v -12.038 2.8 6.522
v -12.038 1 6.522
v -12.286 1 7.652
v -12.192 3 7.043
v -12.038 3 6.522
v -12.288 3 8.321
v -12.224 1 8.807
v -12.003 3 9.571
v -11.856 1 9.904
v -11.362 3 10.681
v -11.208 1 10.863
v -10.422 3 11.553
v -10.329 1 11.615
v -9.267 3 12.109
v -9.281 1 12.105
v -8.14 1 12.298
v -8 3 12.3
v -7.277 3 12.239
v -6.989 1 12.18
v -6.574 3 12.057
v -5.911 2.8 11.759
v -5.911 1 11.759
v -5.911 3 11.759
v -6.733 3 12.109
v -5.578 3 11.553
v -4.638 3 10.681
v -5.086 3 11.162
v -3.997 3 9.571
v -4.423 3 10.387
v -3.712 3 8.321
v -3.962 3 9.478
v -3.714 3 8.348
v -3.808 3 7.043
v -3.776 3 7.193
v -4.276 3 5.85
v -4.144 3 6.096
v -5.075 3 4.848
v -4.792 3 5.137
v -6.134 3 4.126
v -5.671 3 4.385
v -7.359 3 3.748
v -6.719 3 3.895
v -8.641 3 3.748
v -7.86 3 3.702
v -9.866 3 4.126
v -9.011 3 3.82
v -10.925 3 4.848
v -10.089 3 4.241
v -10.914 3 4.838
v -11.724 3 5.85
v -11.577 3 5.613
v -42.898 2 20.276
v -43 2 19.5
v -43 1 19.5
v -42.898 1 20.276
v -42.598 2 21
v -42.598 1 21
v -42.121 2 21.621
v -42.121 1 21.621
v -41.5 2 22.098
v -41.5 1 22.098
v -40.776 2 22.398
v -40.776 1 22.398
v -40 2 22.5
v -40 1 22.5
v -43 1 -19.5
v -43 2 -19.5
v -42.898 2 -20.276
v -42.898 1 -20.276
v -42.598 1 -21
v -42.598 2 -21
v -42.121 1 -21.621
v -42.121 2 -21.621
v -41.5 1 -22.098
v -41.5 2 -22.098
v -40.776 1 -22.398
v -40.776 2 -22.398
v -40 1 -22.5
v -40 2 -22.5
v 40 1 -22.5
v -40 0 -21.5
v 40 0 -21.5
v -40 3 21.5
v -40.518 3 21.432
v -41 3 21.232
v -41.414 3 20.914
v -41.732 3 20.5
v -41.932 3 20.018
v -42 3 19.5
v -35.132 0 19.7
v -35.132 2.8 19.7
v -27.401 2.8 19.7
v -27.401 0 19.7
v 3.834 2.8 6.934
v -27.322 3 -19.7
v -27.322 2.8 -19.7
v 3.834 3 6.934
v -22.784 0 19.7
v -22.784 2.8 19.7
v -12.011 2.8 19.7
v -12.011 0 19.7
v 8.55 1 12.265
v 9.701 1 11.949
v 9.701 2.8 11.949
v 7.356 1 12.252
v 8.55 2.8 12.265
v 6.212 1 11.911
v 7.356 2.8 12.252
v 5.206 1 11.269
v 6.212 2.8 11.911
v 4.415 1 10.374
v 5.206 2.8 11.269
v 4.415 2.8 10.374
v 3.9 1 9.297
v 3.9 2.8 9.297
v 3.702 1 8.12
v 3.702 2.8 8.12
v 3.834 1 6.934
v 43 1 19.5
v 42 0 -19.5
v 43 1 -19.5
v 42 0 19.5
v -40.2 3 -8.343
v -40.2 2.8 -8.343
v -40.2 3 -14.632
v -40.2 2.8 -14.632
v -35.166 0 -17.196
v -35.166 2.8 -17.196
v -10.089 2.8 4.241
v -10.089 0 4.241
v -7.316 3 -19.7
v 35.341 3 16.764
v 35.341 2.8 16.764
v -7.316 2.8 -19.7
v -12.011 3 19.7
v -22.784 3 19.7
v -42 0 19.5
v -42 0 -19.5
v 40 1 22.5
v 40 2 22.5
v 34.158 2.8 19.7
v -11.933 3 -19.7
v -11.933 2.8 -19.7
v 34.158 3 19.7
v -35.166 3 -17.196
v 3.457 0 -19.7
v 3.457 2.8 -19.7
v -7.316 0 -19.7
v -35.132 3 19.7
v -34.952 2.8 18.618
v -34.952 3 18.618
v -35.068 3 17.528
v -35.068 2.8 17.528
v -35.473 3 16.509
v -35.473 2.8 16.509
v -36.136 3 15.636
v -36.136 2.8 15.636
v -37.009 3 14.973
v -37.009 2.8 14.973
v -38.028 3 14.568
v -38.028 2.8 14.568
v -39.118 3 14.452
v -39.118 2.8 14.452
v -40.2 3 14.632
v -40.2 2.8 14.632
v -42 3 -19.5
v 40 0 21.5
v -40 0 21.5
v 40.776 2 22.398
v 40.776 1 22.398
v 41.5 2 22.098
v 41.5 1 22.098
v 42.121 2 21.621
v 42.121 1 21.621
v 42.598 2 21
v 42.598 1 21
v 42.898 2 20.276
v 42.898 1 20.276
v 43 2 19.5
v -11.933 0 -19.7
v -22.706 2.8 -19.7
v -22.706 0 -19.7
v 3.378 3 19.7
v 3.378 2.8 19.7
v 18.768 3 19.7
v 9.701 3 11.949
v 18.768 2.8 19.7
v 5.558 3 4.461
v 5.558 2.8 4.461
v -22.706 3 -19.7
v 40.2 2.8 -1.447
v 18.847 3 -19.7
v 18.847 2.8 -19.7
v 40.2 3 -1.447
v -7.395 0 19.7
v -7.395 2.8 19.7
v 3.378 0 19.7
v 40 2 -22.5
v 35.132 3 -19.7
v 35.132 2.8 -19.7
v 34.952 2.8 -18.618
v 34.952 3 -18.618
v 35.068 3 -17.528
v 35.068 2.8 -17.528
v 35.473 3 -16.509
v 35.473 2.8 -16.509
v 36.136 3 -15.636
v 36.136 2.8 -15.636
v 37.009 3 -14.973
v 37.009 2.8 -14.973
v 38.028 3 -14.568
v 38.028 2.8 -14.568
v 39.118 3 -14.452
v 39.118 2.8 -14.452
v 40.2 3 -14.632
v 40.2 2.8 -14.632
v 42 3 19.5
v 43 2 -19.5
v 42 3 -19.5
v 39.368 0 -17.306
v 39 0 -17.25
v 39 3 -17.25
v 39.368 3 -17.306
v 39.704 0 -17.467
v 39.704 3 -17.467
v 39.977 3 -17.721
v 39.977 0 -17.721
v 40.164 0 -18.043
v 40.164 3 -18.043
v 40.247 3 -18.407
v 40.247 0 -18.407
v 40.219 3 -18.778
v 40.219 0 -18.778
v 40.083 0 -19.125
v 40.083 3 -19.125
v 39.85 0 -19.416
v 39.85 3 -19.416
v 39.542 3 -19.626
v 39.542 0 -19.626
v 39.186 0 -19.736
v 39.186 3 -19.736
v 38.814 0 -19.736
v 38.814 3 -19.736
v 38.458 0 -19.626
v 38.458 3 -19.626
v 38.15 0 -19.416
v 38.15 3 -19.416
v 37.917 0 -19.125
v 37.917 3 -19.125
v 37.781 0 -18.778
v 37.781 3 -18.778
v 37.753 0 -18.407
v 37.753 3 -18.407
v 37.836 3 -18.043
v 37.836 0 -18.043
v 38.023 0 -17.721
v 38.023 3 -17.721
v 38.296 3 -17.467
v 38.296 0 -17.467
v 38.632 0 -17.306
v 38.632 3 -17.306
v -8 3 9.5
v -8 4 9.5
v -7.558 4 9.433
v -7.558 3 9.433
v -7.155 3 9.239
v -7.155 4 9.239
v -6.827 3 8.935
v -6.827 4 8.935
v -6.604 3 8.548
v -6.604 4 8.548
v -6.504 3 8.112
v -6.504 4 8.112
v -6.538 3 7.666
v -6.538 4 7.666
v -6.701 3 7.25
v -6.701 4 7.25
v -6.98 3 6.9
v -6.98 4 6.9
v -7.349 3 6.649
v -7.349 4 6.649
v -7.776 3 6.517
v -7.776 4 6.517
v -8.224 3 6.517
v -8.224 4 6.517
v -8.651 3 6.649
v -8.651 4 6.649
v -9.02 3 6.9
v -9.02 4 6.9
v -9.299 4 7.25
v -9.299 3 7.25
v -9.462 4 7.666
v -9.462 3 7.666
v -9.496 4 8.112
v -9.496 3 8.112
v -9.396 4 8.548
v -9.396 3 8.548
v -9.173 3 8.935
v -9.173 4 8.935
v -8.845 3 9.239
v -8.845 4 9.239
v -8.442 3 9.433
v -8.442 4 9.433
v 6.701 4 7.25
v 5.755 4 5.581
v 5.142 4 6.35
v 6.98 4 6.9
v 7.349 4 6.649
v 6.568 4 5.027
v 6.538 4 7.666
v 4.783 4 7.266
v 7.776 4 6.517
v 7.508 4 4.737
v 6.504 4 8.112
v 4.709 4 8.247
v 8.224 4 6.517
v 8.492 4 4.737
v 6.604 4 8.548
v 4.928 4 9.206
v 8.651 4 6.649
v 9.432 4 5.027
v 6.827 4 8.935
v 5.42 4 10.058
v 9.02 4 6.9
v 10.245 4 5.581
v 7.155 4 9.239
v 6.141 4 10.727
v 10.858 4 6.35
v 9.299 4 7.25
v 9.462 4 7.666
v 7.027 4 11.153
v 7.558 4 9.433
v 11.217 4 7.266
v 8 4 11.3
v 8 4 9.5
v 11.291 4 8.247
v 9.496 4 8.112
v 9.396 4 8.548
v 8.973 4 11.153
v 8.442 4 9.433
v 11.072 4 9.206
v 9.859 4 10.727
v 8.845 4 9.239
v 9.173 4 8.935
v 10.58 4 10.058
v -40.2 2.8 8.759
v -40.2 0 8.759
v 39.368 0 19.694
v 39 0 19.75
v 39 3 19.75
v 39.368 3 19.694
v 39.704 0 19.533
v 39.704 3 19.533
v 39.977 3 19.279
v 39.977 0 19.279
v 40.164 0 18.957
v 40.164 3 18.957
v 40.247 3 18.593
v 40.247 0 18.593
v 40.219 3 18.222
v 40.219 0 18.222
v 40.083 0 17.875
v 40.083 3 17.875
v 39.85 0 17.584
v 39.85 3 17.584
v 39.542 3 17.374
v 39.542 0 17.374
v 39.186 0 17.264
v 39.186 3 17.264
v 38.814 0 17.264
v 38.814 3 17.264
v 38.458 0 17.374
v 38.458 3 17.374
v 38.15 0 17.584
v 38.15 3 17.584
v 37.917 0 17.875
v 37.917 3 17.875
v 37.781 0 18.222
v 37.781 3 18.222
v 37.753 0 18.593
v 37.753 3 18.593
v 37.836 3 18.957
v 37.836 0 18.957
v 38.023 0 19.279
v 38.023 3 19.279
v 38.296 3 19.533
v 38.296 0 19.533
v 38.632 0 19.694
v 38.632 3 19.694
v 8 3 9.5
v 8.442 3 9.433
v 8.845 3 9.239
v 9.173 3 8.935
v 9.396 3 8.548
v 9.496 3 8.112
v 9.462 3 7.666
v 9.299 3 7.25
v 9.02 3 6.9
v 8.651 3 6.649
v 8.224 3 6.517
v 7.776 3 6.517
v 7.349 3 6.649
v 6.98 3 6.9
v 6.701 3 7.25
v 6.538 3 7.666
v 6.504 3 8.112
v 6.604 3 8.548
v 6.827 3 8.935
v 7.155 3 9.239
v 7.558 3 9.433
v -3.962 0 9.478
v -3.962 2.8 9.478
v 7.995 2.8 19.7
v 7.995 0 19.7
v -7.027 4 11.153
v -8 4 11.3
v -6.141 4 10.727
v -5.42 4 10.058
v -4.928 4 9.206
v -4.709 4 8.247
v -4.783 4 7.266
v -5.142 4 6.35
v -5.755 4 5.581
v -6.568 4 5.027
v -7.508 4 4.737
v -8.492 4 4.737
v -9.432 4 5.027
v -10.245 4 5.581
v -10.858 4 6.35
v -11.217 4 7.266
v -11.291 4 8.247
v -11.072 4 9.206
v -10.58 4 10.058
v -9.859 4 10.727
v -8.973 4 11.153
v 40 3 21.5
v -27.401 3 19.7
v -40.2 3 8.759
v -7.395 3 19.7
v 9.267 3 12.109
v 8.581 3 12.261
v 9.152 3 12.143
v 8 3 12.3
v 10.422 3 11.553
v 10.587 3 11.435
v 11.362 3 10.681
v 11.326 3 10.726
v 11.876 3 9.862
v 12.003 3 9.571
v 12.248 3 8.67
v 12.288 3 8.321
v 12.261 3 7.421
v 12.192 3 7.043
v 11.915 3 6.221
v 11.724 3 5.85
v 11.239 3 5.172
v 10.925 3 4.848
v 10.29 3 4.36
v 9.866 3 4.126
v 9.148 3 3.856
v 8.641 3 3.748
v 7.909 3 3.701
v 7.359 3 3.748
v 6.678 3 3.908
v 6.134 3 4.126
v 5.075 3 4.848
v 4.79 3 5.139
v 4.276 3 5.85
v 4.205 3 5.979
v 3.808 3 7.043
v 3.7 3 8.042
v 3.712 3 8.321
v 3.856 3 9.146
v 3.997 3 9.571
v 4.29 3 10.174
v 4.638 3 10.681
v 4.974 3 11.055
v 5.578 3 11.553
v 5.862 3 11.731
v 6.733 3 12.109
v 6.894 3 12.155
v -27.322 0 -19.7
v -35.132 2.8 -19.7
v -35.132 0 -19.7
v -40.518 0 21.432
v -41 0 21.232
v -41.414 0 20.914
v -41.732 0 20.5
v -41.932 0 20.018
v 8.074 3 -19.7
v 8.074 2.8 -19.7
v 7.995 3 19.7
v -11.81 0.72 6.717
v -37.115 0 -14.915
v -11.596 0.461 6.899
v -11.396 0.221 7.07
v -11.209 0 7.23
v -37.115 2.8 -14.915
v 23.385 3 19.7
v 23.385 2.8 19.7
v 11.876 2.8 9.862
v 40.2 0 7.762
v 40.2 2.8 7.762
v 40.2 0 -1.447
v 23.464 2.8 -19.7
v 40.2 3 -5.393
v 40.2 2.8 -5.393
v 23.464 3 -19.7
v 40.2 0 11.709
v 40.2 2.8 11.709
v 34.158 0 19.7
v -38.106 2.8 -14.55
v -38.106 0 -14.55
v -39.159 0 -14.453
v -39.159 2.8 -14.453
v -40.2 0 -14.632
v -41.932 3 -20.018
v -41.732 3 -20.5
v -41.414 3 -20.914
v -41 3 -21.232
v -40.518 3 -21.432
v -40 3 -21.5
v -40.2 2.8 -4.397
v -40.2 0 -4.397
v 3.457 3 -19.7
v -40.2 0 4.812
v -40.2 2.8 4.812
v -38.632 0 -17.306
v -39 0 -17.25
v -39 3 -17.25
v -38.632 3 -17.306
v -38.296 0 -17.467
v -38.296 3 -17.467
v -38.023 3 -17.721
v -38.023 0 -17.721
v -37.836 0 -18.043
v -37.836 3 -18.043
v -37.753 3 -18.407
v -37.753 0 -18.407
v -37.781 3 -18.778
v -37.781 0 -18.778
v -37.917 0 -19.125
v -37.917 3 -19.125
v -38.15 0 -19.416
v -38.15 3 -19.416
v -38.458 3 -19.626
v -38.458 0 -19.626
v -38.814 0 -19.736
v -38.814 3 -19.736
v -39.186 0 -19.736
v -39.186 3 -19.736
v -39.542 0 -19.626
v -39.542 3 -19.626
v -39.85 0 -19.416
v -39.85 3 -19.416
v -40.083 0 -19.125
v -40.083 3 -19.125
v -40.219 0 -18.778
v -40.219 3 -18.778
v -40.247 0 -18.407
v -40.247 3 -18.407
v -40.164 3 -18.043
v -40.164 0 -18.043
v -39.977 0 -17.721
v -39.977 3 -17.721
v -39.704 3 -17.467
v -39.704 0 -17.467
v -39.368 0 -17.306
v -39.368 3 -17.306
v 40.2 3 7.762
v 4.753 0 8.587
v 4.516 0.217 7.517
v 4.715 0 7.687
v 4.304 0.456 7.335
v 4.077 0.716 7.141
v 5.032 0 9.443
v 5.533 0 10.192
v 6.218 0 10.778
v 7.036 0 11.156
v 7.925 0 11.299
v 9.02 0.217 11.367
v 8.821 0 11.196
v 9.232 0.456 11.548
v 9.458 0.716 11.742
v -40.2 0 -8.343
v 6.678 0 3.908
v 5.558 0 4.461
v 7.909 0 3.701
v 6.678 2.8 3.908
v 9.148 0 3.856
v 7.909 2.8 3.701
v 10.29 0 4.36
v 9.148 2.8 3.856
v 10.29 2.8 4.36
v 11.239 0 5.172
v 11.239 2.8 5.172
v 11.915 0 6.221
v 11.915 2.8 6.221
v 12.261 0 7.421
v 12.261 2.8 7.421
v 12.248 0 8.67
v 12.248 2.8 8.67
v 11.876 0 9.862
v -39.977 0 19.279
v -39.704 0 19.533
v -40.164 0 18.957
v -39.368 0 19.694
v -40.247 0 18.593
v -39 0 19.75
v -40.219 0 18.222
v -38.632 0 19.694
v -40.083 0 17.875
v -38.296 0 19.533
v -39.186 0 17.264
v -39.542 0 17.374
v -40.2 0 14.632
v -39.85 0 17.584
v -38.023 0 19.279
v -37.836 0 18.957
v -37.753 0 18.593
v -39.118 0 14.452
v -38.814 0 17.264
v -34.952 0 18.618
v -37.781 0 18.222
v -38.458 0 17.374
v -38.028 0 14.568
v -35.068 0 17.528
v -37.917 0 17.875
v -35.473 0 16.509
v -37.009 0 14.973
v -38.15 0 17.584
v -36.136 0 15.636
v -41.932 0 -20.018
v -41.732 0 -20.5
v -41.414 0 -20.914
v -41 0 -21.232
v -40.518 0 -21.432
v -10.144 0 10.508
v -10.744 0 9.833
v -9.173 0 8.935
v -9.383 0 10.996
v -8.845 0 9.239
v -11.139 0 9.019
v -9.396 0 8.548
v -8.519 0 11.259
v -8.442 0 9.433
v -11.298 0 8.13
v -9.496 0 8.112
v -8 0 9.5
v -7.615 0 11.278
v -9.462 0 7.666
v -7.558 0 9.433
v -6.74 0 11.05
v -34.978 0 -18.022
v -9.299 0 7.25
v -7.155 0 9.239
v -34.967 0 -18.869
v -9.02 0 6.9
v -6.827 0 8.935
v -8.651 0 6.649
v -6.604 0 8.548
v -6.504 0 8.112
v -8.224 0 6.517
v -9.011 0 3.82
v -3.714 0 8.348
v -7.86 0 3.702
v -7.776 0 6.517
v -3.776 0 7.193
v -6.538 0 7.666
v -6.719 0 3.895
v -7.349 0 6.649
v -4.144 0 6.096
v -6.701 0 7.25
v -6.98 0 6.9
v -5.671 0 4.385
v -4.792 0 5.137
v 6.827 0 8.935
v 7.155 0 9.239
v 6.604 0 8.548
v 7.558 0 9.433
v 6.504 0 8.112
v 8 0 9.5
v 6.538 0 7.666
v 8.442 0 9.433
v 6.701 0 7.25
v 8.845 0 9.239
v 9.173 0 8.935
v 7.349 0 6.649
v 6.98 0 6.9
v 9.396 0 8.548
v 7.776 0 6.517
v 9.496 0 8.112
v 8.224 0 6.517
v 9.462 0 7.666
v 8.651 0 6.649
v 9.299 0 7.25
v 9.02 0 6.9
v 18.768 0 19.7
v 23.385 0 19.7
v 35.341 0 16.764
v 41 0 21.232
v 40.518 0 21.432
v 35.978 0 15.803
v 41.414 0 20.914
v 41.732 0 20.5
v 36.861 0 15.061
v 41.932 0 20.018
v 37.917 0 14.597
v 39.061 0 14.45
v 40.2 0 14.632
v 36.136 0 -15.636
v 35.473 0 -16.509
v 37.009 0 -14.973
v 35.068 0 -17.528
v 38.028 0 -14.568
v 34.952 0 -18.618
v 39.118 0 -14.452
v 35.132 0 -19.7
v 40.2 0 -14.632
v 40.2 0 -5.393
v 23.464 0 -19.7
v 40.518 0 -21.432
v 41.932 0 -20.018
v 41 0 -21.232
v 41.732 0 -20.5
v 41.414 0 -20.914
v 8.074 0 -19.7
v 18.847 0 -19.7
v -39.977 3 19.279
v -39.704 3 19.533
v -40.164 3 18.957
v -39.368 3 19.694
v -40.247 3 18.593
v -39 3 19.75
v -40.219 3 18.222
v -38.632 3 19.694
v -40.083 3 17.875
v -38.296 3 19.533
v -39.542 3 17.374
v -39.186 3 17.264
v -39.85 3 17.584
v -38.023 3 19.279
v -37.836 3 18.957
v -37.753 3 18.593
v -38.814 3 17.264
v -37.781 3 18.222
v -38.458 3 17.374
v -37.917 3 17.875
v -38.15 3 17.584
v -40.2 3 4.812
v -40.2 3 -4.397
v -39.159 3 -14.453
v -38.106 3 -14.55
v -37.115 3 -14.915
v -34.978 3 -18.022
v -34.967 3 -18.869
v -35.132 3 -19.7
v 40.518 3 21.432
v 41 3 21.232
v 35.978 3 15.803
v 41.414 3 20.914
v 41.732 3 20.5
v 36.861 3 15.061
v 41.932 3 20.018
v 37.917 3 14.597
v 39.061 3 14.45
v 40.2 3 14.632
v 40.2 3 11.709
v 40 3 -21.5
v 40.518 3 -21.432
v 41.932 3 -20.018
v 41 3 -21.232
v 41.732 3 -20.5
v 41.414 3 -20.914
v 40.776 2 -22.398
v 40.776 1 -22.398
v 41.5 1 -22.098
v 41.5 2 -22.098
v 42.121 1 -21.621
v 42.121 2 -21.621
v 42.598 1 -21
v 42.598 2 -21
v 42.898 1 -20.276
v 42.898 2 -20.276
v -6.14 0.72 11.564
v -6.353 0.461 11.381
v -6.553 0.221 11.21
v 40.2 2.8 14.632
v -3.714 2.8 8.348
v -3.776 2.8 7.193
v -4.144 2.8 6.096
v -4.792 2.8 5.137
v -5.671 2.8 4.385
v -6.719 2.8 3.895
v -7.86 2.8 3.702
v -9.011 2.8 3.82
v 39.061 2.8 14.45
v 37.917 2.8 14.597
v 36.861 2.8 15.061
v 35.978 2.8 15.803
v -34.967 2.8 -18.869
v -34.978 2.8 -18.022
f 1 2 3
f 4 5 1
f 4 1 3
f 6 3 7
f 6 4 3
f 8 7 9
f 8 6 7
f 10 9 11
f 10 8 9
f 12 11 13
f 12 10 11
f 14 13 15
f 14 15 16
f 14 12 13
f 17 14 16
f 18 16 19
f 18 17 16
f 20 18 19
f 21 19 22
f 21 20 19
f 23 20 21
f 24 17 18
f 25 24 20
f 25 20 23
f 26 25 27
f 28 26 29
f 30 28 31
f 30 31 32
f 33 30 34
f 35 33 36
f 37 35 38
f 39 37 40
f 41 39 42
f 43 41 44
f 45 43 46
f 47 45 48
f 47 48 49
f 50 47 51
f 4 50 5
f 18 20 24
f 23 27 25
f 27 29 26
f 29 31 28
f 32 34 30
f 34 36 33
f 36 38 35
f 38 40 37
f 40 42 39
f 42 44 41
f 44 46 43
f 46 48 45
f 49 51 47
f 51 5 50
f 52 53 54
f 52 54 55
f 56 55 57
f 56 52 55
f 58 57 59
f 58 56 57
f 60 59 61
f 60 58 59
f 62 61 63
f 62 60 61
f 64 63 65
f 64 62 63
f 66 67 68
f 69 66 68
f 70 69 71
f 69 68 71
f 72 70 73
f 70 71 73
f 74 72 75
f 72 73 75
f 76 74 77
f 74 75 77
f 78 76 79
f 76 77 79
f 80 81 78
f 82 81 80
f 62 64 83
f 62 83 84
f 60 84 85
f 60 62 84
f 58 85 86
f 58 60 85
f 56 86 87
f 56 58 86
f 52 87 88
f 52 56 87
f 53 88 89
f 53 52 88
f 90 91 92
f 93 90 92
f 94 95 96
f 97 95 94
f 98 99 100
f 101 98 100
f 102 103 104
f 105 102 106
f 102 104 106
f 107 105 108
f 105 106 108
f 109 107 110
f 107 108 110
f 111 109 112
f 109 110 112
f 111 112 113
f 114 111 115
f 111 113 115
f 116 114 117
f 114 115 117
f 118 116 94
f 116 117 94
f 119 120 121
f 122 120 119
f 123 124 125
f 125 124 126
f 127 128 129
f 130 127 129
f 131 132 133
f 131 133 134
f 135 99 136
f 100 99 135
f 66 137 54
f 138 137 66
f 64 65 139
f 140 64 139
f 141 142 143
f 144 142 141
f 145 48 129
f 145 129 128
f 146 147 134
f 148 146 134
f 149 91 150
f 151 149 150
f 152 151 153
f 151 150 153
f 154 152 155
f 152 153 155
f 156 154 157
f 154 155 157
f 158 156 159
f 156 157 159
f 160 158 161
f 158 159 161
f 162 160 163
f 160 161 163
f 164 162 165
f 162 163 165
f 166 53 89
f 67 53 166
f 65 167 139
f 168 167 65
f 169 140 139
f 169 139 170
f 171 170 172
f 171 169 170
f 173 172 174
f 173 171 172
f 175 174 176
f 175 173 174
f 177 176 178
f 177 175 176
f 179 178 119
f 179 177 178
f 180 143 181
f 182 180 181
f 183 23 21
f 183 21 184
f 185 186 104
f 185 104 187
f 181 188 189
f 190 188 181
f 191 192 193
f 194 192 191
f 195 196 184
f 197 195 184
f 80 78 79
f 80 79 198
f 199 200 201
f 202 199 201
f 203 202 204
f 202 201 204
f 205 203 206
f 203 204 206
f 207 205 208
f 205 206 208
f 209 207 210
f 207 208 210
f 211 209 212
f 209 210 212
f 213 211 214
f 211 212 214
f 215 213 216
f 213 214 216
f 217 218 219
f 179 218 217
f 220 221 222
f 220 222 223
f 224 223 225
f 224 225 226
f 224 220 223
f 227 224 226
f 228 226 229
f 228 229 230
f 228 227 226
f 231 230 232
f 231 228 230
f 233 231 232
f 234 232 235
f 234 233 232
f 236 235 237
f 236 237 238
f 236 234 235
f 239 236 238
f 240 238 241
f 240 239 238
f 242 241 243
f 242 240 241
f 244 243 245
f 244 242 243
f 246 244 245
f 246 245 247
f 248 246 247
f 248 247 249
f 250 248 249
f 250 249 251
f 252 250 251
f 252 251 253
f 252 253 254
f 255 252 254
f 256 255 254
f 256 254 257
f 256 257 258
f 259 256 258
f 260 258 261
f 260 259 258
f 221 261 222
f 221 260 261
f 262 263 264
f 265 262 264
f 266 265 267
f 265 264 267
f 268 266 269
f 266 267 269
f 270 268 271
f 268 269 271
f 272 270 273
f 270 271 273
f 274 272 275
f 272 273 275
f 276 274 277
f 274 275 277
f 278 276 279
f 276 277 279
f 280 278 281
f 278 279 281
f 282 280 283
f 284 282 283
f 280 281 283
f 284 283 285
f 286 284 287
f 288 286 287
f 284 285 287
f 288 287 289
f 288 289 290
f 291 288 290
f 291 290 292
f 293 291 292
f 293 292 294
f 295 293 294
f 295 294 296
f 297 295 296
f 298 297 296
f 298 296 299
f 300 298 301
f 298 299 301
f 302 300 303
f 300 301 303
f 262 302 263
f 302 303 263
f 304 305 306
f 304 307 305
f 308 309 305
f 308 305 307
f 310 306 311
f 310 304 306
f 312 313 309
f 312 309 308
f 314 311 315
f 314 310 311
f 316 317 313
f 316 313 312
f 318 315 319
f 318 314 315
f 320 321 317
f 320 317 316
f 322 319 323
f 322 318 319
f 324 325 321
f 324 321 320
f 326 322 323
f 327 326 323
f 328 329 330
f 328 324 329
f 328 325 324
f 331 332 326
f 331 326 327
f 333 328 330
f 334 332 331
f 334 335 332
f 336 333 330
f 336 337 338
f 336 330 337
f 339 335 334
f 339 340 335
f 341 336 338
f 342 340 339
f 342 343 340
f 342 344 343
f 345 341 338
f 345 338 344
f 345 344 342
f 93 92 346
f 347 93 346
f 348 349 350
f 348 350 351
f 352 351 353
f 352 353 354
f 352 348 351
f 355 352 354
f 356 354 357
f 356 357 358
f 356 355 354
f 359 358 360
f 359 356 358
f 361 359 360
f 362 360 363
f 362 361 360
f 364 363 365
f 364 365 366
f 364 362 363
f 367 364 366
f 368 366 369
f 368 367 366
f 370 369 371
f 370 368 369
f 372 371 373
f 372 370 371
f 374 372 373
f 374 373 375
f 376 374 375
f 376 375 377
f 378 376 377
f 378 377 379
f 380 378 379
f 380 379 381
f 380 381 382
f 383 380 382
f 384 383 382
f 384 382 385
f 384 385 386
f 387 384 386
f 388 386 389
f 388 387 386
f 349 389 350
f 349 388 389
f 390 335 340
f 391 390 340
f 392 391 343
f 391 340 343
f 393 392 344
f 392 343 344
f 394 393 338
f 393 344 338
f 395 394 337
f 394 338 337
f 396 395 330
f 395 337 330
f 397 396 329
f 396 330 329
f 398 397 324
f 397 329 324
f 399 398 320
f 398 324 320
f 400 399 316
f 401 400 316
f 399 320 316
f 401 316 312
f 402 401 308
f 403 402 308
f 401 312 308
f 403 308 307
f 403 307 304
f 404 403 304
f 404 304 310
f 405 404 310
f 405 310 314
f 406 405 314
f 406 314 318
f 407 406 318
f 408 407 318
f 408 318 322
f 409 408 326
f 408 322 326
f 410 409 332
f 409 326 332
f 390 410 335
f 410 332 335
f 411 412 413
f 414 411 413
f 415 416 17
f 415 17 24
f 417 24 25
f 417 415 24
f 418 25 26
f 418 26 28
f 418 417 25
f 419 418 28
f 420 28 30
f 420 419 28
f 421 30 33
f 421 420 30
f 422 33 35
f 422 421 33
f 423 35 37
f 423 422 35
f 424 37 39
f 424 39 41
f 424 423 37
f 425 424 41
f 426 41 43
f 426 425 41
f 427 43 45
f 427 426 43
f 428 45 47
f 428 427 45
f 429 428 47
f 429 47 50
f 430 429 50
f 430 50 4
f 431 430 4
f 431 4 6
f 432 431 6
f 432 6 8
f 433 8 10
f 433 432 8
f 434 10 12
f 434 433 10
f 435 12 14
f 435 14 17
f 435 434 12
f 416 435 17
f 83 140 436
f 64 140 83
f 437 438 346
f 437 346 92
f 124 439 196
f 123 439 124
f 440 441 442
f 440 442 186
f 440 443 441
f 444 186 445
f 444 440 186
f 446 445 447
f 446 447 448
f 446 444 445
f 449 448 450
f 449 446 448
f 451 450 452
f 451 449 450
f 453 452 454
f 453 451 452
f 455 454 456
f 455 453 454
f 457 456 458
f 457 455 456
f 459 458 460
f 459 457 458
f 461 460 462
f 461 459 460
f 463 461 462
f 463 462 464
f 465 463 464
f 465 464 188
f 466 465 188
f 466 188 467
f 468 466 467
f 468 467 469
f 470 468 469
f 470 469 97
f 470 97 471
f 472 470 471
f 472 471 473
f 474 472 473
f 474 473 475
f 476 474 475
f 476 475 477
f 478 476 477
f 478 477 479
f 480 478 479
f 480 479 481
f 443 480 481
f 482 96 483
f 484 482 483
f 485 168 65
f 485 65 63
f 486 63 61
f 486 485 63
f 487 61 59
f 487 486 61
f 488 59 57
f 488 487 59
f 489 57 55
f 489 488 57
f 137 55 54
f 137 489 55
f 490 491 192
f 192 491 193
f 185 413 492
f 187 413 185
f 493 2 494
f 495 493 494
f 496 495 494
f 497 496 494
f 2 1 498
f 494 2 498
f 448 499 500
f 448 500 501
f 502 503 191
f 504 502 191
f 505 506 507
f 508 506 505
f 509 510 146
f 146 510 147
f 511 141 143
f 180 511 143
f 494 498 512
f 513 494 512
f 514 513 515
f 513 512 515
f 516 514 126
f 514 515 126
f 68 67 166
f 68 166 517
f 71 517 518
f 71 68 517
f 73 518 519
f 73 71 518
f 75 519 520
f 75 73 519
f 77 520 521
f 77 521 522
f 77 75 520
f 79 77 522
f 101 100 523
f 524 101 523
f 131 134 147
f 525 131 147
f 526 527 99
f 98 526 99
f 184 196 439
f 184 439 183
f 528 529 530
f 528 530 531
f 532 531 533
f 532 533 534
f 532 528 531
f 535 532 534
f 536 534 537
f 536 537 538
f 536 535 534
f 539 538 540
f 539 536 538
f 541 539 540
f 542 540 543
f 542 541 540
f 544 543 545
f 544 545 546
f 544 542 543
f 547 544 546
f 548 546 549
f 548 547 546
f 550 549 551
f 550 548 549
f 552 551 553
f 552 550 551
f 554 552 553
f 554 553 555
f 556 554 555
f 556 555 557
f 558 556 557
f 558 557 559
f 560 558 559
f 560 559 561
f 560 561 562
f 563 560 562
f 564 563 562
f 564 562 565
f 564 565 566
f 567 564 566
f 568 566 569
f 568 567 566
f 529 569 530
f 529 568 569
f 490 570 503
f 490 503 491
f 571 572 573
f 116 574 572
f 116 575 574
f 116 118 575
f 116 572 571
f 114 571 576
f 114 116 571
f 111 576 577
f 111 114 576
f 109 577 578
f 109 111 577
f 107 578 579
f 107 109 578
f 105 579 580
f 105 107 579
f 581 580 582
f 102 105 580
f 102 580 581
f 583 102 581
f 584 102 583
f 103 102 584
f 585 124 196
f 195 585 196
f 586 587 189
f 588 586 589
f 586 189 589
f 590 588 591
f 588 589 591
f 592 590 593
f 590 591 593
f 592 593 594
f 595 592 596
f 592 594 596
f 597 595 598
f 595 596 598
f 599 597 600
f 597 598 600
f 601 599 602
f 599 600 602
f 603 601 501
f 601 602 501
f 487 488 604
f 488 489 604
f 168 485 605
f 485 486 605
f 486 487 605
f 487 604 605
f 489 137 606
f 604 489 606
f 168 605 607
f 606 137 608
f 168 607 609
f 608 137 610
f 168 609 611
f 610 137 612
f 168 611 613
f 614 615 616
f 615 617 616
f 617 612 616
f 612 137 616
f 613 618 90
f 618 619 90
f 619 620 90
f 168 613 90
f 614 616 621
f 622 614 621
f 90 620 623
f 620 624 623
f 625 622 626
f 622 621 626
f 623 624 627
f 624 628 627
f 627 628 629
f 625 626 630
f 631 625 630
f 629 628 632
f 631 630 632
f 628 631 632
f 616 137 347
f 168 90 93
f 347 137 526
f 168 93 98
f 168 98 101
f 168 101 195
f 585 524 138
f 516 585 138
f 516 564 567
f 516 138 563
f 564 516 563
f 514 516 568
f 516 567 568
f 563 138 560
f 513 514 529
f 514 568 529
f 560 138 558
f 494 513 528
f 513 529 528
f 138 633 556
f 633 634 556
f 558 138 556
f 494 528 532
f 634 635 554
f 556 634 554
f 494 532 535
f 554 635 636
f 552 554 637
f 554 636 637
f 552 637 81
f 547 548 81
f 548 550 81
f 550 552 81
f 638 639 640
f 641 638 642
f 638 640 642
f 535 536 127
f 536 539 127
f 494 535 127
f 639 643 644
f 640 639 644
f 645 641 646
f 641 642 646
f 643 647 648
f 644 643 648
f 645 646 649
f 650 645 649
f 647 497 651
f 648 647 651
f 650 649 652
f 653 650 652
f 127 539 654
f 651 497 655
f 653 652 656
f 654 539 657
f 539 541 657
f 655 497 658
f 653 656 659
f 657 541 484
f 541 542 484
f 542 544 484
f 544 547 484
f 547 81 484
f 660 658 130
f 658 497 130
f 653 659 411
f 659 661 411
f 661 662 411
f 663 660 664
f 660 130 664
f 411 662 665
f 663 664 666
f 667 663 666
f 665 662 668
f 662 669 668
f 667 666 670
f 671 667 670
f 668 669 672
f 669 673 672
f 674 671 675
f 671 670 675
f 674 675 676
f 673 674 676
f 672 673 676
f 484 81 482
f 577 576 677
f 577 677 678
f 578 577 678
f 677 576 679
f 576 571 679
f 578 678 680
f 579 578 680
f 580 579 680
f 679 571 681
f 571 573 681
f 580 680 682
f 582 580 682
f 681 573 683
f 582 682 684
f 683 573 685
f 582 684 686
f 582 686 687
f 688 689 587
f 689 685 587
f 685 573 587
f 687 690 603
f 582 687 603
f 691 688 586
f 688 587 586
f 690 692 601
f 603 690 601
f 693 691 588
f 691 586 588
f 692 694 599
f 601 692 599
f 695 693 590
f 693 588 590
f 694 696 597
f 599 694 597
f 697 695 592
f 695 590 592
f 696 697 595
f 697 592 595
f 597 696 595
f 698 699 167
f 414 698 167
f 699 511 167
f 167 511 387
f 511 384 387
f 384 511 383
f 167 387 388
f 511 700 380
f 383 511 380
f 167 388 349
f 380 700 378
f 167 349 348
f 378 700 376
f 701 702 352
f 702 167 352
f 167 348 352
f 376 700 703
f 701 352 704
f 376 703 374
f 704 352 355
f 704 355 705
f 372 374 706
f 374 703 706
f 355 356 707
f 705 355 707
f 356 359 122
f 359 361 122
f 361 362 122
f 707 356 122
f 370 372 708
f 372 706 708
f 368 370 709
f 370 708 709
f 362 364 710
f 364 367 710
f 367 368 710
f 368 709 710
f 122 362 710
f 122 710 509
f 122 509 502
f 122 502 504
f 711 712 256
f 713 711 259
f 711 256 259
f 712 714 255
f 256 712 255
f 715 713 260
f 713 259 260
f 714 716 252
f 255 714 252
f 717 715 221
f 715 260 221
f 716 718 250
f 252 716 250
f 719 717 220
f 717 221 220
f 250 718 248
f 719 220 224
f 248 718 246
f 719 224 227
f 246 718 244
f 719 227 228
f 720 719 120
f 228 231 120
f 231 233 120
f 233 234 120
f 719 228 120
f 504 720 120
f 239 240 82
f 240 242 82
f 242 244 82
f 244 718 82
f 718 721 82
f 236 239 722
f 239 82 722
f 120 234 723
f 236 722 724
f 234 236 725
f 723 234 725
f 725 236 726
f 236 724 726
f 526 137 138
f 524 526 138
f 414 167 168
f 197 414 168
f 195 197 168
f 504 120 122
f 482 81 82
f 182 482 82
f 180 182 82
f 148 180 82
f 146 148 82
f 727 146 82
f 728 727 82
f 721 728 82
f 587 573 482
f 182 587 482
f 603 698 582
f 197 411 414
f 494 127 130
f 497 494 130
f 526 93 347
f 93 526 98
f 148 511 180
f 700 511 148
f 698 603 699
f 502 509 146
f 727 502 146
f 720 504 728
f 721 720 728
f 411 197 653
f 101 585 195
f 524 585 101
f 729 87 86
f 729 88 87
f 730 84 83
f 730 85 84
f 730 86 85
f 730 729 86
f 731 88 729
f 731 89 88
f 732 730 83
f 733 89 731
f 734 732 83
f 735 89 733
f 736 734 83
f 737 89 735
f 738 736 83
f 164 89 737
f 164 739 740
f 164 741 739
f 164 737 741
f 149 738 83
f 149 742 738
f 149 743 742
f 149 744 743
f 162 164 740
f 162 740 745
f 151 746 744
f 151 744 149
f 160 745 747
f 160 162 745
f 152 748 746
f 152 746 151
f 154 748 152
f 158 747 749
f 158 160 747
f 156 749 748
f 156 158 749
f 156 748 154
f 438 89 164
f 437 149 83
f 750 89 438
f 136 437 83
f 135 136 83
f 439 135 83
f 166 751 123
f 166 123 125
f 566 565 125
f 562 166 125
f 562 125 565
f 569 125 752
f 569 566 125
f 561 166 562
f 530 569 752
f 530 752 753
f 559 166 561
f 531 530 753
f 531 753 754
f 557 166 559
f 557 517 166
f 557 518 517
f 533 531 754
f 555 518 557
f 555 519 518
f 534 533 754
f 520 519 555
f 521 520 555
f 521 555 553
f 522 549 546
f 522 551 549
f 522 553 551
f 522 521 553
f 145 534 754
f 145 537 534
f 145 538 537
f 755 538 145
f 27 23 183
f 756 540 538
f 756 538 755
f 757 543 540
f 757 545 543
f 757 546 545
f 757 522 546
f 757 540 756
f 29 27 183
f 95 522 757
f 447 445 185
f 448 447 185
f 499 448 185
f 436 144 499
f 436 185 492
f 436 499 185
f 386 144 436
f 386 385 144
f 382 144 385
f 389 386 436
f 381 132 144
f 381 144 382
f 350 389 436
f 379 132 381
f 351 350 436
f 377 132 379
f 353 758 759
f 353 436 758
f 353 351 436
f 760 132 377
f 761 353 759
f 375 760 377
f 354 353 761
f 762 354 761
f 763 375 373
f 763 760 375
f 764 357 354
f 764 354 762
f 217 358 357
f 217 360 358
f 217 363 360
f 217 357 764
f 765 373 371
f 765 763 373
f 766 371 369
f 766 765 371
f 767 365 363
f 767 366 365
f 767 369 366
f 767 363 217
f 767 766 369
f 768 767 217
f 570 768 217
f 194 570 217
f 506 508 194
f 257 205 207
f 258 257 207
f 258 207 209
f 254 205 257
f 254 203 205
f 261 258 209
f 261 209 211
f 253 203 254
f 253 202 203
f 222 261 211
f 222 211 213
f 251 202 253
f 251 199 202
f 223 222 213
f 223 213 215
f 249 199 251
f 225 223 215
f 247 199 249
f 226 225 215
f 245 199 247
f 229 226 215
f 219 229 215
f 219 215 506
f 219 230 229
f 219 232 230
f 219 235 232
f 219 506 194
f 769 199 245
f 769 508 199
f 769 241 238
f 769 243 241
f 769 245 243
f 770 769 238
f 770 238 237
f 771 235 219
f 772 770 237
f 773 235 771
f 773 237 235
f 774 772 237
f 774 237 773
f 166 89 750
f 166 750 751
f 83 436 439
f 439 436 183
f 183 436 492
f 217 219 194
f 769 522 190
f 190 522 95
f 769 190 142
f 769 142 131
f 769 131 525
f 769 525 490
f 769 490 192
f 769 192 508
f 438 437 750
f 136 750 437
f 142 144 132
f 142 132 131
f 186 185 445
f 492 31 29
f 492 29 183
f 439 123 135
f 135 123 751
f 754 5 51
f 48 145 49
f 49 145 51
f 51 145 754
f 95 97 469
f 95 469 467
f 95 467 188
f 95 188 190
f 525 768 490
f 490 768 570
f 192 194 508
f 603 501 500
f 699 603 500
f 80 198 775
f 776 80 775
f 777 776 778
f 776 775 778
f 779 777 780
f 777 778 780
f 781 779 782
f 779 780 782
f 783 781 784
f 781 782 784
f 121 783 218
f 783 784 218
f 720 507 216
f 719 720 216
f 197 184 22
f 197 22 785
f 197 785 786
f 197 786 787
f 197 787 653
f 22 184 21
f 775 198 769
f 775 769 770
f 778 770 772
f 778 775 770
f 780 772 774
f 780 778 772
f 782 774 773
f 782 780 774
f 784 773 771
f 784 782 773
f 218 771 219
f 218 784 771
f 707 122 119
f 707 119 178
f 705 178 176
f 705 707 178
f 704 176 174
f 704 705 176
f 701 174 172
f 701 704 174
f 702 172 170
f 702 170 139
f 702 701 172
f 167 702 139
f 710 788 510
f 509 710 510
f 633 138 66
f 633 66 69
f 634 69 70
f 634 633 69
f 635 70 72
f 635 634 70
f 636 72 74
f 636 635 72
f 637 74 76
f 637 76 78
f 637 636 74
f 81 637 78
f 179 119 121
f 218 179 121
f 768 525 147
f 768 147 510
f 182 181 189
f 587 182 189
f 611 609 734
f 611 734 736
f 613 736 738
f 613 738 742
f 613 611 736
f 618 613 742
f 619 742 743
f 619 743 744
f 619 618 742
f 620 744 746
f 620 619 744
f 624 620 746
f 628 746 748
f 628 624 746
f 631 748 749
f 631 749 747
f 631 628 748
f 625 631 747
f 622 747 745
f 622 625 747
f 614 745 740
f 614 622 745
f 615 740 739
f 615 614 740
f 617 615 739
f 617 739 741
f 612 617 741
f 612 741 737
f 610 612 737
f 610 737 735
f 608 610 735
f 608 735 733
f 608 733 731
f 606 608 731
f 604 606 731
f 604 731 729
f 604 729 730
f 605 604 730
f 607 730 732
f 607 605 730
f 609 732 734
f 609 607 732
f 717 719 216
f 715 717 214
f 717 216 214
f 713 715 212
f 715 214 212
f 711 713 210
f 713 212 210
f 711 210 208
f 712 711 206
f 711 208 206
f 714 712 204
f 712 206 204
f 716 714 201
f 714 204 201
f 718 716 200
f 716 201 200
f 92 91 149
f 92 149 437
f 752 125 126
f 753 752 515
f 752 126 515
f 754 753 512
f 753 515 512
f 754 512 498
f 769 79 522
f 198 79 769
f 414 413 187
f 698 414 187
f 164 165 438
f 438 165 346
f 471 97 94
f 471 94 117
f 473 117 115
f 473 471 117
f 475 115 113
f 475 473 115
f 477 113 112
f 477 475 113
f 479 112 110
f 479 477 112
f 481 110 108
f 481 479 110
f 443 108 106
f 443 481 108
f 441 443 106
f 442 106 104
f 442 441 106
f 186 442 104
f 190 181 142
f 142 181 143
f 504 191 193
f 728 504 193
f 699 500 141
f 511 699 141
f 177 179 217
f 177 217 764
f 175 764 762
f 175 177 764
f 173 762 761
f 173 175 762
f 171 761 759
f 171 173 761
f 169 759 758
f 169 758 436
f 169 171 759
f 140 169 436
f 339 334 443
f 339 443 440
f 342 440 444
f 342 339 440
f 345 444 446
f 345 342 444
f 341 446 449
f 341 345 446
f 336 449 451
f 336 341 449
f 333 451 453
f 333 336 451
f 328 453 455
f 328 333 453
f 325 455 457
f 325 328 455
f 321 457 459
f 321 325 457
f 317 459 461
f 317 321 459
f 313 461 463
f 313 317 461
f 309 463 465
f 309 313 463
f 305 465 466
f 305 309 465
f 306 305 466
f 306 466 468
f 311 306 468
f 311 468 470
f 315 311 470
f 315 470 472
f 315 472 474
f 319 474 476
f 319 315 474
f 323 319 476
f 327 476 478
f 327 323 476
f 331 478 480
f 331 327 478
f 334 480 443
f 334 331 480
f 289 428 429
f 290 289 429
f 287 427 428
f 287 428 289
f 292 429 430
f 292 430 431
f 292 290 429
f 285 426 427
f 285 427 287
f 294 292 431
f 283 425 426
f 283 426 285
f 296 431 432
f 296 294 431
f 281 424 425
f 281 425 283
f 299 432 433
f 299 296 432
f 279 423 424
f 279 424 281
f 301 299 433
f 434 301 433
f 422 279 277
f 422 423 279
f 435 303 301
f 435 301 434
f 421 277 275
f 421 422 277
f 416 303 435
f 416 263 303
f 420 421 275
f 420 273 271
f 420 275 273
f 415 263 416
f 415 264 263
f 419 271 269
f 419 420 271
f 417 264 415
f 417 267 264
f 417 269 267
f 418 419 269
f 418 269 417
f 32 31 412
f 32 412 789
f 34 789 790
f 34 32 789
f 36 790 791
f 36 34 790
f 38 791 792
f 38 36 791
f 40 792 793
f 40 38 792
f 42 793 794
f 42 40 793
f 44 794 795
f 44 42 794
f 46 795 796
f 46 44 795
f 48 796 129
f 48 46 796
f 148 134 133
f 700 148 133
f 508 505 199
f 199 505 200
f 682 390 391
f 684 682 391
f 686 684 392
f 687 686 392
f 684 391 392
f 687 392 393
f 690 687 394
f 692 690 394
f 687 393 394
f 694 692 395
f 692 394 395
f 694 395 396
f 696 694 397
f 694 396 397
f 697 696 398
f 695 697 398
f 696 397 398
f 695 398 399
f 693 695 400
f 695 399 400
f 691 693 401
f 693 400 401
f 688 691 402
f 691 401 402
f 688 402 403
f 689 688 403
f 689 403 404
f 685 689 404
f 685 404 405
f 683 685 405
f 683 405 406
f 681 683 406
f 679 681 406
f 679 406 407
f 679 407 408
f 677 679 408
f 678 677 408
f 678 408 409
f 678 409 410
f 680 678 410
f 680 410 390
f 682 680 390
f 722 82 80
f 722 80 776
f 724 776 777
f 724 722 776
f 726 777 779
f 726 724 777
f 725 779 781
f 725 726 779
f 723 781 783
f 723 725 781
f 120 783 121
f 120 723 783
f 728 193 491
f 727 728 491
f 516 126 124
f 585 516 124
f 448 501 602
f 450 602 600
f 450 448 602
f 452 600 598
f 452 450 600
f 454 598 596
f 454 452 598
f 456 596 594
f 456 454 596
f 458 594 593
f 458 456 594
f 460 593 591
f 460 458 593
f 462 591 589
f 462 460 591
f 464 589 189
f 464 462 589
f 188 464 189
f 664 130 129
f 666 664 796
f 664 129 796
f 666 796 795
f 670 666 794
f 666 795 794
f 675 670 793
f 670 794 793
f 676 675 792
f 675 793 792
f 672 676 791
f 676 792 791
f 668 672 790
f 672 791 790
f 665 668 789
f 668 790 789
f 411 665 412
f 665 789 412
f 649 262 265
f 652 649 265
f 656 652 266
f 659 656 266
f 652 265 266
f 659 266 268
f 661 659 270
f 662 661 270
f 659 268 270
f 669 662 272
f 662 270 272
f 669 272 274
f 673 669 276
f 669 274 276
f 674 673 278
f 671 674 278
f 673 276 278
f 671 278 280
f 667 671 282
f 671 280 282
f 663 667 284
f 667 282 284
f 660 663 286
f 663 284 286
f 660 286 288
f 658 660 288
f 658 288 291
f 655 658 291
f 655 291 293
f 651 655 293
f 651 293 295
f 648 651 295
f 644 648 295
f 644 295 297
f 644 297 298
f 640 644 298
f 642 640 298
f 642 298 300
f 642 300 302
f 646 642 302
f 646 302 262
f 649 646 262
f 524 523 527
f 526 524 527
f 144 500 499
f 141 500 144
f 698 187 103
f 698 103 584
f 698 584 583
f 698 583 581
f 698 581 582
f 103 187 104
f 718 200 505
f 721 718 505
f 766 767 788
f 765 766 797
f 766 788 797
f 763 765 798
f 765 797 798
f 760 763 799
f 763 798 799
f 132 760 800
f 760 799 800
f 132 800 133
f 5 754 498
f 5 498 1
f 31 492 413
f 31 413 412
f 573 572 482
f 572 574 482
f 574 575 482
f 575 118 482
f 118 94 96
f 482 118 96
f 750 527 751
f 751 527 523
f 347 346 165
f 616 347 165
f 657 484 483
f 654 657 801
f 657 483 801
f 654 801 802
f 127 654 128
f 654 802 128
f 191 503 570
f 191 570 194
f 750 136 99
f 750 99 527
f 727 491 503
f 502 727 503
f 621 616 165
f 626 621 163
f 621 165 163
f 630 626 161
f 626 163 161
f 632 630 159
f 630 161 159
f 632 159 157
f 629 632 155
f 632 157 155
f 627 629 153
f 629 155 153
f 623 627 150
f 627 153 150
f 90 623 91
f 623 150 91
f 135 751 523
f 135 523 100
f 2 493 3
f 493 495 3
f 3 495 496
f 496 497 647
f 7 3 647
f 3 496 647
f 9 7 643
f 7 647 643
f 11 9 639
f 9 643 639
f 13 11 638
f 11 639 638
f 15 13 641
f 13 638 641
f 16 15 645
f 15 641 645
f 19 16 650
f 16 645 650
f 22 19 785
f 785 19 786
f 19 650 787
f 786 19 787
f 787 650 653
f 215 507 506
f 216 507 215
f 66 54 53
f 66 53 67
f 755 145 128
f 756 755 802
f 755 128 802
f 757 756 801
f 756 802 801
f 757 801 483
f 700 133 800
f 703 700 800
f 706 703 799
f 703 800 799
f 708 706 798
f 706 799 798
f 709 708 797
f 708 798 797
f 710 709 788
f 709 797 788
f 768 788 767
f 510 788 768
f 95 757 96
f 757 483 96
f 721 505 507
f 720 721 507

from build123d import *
from build123d.topology import SkipClean

# Parameters (mm, degrees)
SKETCH1_W           = 86
SKETCH1_H           = 45
SKETCH1_R           = 1.25
BOSS_EXTRUDE1_DEPTH = 3
FILLET1_R           = 3
SKETCH2_R           = 1.5
CUT_EXTRUDE1_DEPTH  = 49.623553963
SHELL1_T            = -2.8
RIB1_REACH          = 50.624
CUT_EXTRUDE2_DEPTH  = 49.623553963
BOSS_EXTRUDE2_START = 1
SKETCH5_R           = 4.3
SKETCH5_R_2         = 1.5
BOSS_EXTRUDE2_DEPTH = 1
CHAMFER1_SIZE       = 1


with BuildPart() as part:
    # Sketch1 → Boss-Extrude1 (new body)
    with BuildSketch(Plane(origin=(0, 0, 0), x_dir=(1, 0, 0), z_dir=(0, 1, 0))):
        Rectangle(SKETCH1_W, SKETCH1_H)
        with Locations(Location((-39, 18.5, 0), (0, 0, 270))):
            Circle(SKETCH1_R, mode=Mode.SUBTRACT)
        with Locations(Location((39, 18.5, 0), (0, 0, 270))):
            Circle(SKETCH1_R, mode=Mode.SUBTRACT)
        with Locations(Location((39, -18.5, 0), (0, 0, 270))):
            Circle(SKETCH1_R, mode=Mode.SUBTRACT)
        with Locations(Location((-39, -18.5, 0), (0, 0, 270))):
            Circle(SKETCH1_R, mode=Mode.SUBTRACT)
    extrude(amount=BOSS_EXTRUDE1_DEPTH)

    # Fillet1
    fillet1_edges = [part.edges().sort_by_distance(p)[0] for p in [
        (43, 1.5, 22.5),
        (-43, 1.5, 22.5),
        (-43, 1.5, -22.5),
        (43, 1.5, -22.5),
    ]]
    fillet(fillet1_edges, radius=FILLET1_R)

    # Sketch2 → Cut-Extrude1 (cut, through all)
    with BuildSketch(Plane(origin=(0, 3, 0), x_dir=(1, 0, 0), z_dir=(0, 1, 0))):
        with Locations(Location((8, -8, 0), (0, 0, 270))):
            Circle(SKETCH2_R)
        with Locations(Location((-8, -8, 0), (0, 0, 270))):
            Circle(SKETCH2_R)
    extrude(amount=-CUT_EXTRUDE1_DEPTH, mode=Mode.SUBTRACT)

    # Shell1
    shell1_openings = [part.faces().sort_by_distance(p)[0] for p in [
        (0, 3, -0.029540883),
    ]]
    offset(amount=SHELL1_T, openings=shell1_openings)

    # Sketch3 walls → Rib1 (add, up to next)
    with BuildSketch(Plane(origin=(0, 3, 0), x_dir=(1, 0, 0), z_dir=(0, 1, 0)), mode=Mode.PRIVATE) as rib1_sk1:
        Polygon((-77.783977456, 23.369087639), (9.570170192, -51.304619221), (11.519513639, -49.024255188), (-75.834634008, 25.649451672), align=None)
    rib1_tool1 = extrude(rib1_sk1.sketch, amount=-RIB1_REACH, mode=Mode.PRIVATE) - part.part
    # Sketch3 walls → Rib1 (add, up to next)
    with BuildSketch(Plane(origin=(0, 3, 0), x_dir=(1, 0, 0), z_dir=(0, 1, 0)), mode=Mode.PRIVATE) as rib1_sk2:
        Polygon((-75.930079406, 34.940098058), (22.974178135, -49.60708984), (24.923521582, -47.326725807), (-73.980735959, 37.220462091), align=None)
    rib1_tool2 = extrude(rib1_sk2.sketch, amount=-RIB1_REACH, mode=Mode.PRIVATE) - part.part
    # Sketch3 walls → Rib1 (add, up to next)
    with BuildSketch(Plane(origin=(0, 3, 0), x_dir=(1, 0, 0), z_dir=(0, 1, 0)), mode=Mode.PRIVATE) as rib1_sk3:
        Polygon((26.191376207, -35.254742784), (-71.50019667, 48.255795321), (-73.449540118, 45.975431288), (24.24203276, -37.535106817), align=None)
    rib1_tool3 = extrude(rib1_sk3.sketch, amount=-RIB1_REACH, mode=Mode.PRIVATE) - part.part
    # Sketch3 walls → Rib1 (add, up to next)
    with BuildSketch(Plane(origin=(0, 3, 0), x_dir=(1, 0, 0), z_dir=(0, 1, 0)), mode=Mode.PRIVATE) as rib1_sk4:
        Polygon((41.943939257, -35.56484922), (-56.370030956, 48.47773822), (-58.319374403, 46.197374186), (39.994595809, -37.845213253), align=None)
    rib1_tool4 = extrude(rib1_sk4.sketch, amount=-RIB1_REACH, mode=Mode.PRIVATE) - part.part
    # Sketch3 walls → Rib1 (add, up to next)
    with BuildSketch(Plane(origin=(0, 3, 0), x_dir=(1, 0, 0), z_dir=(0, 1, 0)), mode=Mode.PRIVATE) as rib1_sk5:
        Polygon((-42.364199116, 19.402478496), (40.17566685, -51.155794023), (42.125010297, -48.87542999), (-40.414855668, 21.682842529), align=None)
    rib1_tool5 = extrude(rib1_sk5.sketch, amount=-RIB1_REACH, mode=Mode.PRIVATE) - part.part
    # Sketch3 walls → Rib1 (add, up to next)
    with BuildSketch(Plane(origin=(0, 3, 0), x_dir=(1, 0, 0), z_dir=(0, 1, 0)), mode=Mode.PRIVATE) as rib1_sk6:
        Polygon((-27.344787823, 19.719098562), (56.5220764, -51.973543436), (58.471419848, -49.693179403), (-25.395444376, 21.999462595), align=None)
    rib1_tool6 = extrude(rib1_sk6.sketch, amount=-RIB1_REACH, mode=Mode.PRIVATE) - part.part
    # Sketch3 walls → Rib1 (add, up to next)
    with BuildSketch(Plane(origin=(0, 3, 0), x_dir=(1, 0, 0), z_dir=(0, 1, 0)), mode=Mode.PRIVATE) as rib1_sk7:
        Polygon((-44.38155309, 47.438579234), (68.87285442, -49.375672346), (70.822197867, -47.095308313), (-42.432209642, 49.718943267), align=None)
    rib1_tool7 = extrude(rib1_sk7.sketch, amount=-RIB1_REACH, mode=Mode.PRIVATE) - part.part
    # Sketch3 walls → Rib1 (add, up to next)
    with BuildSketch(Plane(origin=(0, 3, 0), x_dir=(1, 0, 0), z_dir=(0, 1, 0)), mode=Mode.PRIVATE) as rib1_sk8:
        Polygon((-28.60953629, 47.11184298), (71.48616066, -38.453833446), (73.435504108, -36.173469413), (-26.660192843, 49.392207013), align=None)
    rib1_tool8 = extrude(rib1_sk8.sketch, amount=-RIB1_REACH, mode=Mode.PRIVATE) - part.part
    # Sketch3 walls → Rib1 (add, up to next)
    with BuildSketch(Plane(origin=(0, 3, 0), x_dir=(1, 0, 0), z_dir=(0, 1, 0)), mode=Mode.PRIVATE) as rib1_sk9:
        Polygon((-14.02835821, 47.803081759), (73.331762126, -26.875730786), (75.281105573, -24.595366753), (-12.079014763, 50.083445792), align=None)
    rib1_tool9 = extrude(rib1_sk9.sketch, amount=-RIB1_REACH, mode=Mode.PRIVATE) - part.part
    add(rib1_tool1.solids().sort_by_distance((-33.132231908, 3, 12.827583774))[0])
    add(rib1_tool2.solids().sort_by_distance((-25.503278912, 3, 6.193313875))[0])
    add(rib1_tool3.solids().sort_by_distance((-23.629081955, 3, -5.360344252))[0])
    add(rib1_tool4.solids().sort_by_distance((-8.187717573, 3, -5.316262483))[0])
    add(rib1_tool5.solids().sort_by_distance((-0.119594409, 3, 14.736475747))[0])
    add(rib1_tool6.solids().sort_by_distance((15.563316012, 3, 14.987040421))[0])
    add(rib1_tool7.solids().sort_by_distance((13.220322389, 3, -0.17163546))[0])
    add(rib1_tool8.solids().sort_by_distance((22.412983909, 3, -5.469186783))[0])
    add(rib1_tool9.solids().sort_by_distance((30.626373682, 3, -11.603857503))[0])

    # Sketch4 → Cut-Extrude2 (cut, through all)
    with SkipClean():  # the faces are left unmerged after this step: merging them gives an invalid solid
        with BuildSketch(Plane(origin=(0, 3, 0), x_dir=(1, 0, 0), z_dir=(0, 1, 0))):
            with BuildLine():
                Line((-27.401271161, -19.7), (-40.2, -8.759151154))
                Line((-40.2, -8.759151154), (-40.2, -14.631860913))
                ThreePointArc((-40.2, -14.631860913), (-36.136217536, -15.636217536), (-35.131860913, -19.7))
                Line((-35.131860913, -19.7), (-27.401271161, -19.7))
            make_face()
            Polygon((-12.011474131, -19.7), (-40.2, 4.396643081), (-40.2, -4.812412883), (-22.784332052, -19.7), align=None)
            with BuildLine():
                Line((3.378322898, -19.7), (-5.911467584, -11.758727491))
                ThreePointArc((-5.911467584, -11.758727491), (-10.794058942, -11.268521781), (-12.037875863, -6.521636542))
                Line((-12.037875863, -6.521636542), (-37.115109774, 14.915353736))
                ThreePointArc((-37.115109774, 14.915353736), (-38.629377954, 14.466993764), (-40.2, 14.631860913))
                Line((-40.2, 14.631860913), (-40.2, 8.343381352))
                Line((-40.2, 8.343381352), (-7.394535022, -19.7))
                Line((-7.394535022, -19.7), (3.378322898, -19.7))
            make_face()
            with BuildLine():
                Line((18.768119928, -19.7), (9.701138512, -11.949193305))
                ThreePointArc((9.701138512, -11.949193305), (5.205941058, -11.268521781), (3.834243685, -6.933944502))
                Line((3.834243685, -6.933944502), (-27.32244611, 19.7))
                Line((-27.32244611, 19.7), (-35.131860913, 19.7))
                ThreePointArc((-35.131860913, 19.7), (-34.950371139, 18.445172177), (-35.165766327, 17.195717769))
                Line((-35.165766327, 17.195717769), (-10.088532416, -4.241272509))
                ThreePointArc((-10.088532416, -4.241272509), (-5.205941058, -4.731478219), (-3.962124137, -9.478363458))
                Line((-3.962124137, -9.478363458), (7.995262007, -19.7))
                Line((7.995262007, -19.7), (18.768119928, -19.7))
            make_face()
            with BuildLine():
                Line((34.157916958, -19.7), (-11.93264908, 19.7))
                Line((-11.93264908, 19.7), (-22.705507001, 19.7))
                Line((-22.705507001, 19.7), (5.557974977, -4.460718465))
                ThreePointArc((5.557974977, -4.460718465), (10.794058942, -4.731478219), (11.876094115, -9.861691277))
                Line((11.876094115, -9.861691277), (23.385059037, -19.7))
                Line((23.385059037, -19.7), (34.157916958, -19.7))
            make_face()
            with BuildLine():
                Line((40.2, -11.709212236), (3.45714795, 19.7))
                Line((3.45714795, 19.7), (-7.315709971, 19.7))
                Line((-7.315709971, 19.7), (35.340744315, -16.764388341))
                ThreePointArc((35.340744315, -16.764388341), (37.372454935, -14.791415761), (40.2, -14.631860913))
                Line((40.2, -14.631860913), (40.2, -11.709212236))
            make_face()
            Polygon((40.2, 1.446581999), (18.84694498, 19.7), (8.074087059, 19.7), (40.2, -7.762473966), align=None)
            with BuildLine():
                Line((35.131860913, 19.7), (23.463884089, 19.7))
                Line((23.463884089, 19.7), (40.2, 5.393320269))
                Line((40.2, 5.393320269), (40.2, 14.631860913))
                ThreePointArc((40.2, 14.631860913), (36.136217536, 15.636217536), (35.131860913, 19.7))
            make_face()
        extrude(amount=-CUT_EXTRUDE2_DEPTH, mode=Mode.SUBTRACT)

    # Sketch5 → Boss-Extrude2 (add)
    # profile 1 of 2: a face of its own
    with SkipClean():  # the faces are left unmerged after this step: merging them gives an invalid solid
        with BuildSketch(Plane(origin=(0, 3, 0), x_dir=(1, 0, 0), z_dir=(0, 1, 0)).offset(BOSS_EXTRUDE2_START)):
            with Locations(Location((-8, -8, 0), (0, 0, 270))):
                Circle(SKETCH5_R)
            with Locations(Location((-8, -8, 0), (0, 0, 270))):
                Circle(SKETCH5_R_2, mode=Mode.SUBTRACT)
        # profile 2 of 2: a face of its own
        with BuildSketch(Plane(origin=(0, 3, 0), x_dir=(1, 0, 0), z_dir=(0, 1, 0)).offset(BOSS_EXTRUDE2_START)):
            with Locations(Location((8, -8, 0), (0, 0, 270))):
                Circle(SKETCH5_R)
            with Locations(Location((8, -8, 0), (0, 0, 270))):
                Circle(SKETCH5_R_2, mode=Mode.SUBTRACT)
        extrude(amount=-BOSS_EXTRUDE2_DEPTH)

    # Chamfer1
    chamfer1_edges = [part.edges().sort_by_distance(p)[0] for p in [
        (-8, 4, 3.7),
        (8, 4, 3.7),
        (-43, 0, 0),
        (-43, 3, 0),
        (43, 0, 0),
        (0, 0, 22.5),
        (0, 0, -22.5),
        (-42.121320344, 0, 21.621320344),
        (42.121320344, 0, 21.621320344),
        (42.121320344, 0, -21.621320344),
        (-42.121320344, 0, -21.621320344),
        (0, 3, -22.5),
        (43, 3, 0),
        (0, 3, 22.5),
        (-42.121320344, 3, 21.621320344),
        (42.121320344, 3, 21.621320344),
        (42.121320344, 3, -21.621320344),
        (-42.121320344, 3, -21.621320344),
        (5.205941058, 0, 11.268521781),
        (-10.794058942, 0, 11.268521781),
    ]]
    chamfer(chamfer1_edges, length=CHAMFER1_SIZE - 0.0001)  # a hair under: the kernel refuses the full size


solid = part.part
